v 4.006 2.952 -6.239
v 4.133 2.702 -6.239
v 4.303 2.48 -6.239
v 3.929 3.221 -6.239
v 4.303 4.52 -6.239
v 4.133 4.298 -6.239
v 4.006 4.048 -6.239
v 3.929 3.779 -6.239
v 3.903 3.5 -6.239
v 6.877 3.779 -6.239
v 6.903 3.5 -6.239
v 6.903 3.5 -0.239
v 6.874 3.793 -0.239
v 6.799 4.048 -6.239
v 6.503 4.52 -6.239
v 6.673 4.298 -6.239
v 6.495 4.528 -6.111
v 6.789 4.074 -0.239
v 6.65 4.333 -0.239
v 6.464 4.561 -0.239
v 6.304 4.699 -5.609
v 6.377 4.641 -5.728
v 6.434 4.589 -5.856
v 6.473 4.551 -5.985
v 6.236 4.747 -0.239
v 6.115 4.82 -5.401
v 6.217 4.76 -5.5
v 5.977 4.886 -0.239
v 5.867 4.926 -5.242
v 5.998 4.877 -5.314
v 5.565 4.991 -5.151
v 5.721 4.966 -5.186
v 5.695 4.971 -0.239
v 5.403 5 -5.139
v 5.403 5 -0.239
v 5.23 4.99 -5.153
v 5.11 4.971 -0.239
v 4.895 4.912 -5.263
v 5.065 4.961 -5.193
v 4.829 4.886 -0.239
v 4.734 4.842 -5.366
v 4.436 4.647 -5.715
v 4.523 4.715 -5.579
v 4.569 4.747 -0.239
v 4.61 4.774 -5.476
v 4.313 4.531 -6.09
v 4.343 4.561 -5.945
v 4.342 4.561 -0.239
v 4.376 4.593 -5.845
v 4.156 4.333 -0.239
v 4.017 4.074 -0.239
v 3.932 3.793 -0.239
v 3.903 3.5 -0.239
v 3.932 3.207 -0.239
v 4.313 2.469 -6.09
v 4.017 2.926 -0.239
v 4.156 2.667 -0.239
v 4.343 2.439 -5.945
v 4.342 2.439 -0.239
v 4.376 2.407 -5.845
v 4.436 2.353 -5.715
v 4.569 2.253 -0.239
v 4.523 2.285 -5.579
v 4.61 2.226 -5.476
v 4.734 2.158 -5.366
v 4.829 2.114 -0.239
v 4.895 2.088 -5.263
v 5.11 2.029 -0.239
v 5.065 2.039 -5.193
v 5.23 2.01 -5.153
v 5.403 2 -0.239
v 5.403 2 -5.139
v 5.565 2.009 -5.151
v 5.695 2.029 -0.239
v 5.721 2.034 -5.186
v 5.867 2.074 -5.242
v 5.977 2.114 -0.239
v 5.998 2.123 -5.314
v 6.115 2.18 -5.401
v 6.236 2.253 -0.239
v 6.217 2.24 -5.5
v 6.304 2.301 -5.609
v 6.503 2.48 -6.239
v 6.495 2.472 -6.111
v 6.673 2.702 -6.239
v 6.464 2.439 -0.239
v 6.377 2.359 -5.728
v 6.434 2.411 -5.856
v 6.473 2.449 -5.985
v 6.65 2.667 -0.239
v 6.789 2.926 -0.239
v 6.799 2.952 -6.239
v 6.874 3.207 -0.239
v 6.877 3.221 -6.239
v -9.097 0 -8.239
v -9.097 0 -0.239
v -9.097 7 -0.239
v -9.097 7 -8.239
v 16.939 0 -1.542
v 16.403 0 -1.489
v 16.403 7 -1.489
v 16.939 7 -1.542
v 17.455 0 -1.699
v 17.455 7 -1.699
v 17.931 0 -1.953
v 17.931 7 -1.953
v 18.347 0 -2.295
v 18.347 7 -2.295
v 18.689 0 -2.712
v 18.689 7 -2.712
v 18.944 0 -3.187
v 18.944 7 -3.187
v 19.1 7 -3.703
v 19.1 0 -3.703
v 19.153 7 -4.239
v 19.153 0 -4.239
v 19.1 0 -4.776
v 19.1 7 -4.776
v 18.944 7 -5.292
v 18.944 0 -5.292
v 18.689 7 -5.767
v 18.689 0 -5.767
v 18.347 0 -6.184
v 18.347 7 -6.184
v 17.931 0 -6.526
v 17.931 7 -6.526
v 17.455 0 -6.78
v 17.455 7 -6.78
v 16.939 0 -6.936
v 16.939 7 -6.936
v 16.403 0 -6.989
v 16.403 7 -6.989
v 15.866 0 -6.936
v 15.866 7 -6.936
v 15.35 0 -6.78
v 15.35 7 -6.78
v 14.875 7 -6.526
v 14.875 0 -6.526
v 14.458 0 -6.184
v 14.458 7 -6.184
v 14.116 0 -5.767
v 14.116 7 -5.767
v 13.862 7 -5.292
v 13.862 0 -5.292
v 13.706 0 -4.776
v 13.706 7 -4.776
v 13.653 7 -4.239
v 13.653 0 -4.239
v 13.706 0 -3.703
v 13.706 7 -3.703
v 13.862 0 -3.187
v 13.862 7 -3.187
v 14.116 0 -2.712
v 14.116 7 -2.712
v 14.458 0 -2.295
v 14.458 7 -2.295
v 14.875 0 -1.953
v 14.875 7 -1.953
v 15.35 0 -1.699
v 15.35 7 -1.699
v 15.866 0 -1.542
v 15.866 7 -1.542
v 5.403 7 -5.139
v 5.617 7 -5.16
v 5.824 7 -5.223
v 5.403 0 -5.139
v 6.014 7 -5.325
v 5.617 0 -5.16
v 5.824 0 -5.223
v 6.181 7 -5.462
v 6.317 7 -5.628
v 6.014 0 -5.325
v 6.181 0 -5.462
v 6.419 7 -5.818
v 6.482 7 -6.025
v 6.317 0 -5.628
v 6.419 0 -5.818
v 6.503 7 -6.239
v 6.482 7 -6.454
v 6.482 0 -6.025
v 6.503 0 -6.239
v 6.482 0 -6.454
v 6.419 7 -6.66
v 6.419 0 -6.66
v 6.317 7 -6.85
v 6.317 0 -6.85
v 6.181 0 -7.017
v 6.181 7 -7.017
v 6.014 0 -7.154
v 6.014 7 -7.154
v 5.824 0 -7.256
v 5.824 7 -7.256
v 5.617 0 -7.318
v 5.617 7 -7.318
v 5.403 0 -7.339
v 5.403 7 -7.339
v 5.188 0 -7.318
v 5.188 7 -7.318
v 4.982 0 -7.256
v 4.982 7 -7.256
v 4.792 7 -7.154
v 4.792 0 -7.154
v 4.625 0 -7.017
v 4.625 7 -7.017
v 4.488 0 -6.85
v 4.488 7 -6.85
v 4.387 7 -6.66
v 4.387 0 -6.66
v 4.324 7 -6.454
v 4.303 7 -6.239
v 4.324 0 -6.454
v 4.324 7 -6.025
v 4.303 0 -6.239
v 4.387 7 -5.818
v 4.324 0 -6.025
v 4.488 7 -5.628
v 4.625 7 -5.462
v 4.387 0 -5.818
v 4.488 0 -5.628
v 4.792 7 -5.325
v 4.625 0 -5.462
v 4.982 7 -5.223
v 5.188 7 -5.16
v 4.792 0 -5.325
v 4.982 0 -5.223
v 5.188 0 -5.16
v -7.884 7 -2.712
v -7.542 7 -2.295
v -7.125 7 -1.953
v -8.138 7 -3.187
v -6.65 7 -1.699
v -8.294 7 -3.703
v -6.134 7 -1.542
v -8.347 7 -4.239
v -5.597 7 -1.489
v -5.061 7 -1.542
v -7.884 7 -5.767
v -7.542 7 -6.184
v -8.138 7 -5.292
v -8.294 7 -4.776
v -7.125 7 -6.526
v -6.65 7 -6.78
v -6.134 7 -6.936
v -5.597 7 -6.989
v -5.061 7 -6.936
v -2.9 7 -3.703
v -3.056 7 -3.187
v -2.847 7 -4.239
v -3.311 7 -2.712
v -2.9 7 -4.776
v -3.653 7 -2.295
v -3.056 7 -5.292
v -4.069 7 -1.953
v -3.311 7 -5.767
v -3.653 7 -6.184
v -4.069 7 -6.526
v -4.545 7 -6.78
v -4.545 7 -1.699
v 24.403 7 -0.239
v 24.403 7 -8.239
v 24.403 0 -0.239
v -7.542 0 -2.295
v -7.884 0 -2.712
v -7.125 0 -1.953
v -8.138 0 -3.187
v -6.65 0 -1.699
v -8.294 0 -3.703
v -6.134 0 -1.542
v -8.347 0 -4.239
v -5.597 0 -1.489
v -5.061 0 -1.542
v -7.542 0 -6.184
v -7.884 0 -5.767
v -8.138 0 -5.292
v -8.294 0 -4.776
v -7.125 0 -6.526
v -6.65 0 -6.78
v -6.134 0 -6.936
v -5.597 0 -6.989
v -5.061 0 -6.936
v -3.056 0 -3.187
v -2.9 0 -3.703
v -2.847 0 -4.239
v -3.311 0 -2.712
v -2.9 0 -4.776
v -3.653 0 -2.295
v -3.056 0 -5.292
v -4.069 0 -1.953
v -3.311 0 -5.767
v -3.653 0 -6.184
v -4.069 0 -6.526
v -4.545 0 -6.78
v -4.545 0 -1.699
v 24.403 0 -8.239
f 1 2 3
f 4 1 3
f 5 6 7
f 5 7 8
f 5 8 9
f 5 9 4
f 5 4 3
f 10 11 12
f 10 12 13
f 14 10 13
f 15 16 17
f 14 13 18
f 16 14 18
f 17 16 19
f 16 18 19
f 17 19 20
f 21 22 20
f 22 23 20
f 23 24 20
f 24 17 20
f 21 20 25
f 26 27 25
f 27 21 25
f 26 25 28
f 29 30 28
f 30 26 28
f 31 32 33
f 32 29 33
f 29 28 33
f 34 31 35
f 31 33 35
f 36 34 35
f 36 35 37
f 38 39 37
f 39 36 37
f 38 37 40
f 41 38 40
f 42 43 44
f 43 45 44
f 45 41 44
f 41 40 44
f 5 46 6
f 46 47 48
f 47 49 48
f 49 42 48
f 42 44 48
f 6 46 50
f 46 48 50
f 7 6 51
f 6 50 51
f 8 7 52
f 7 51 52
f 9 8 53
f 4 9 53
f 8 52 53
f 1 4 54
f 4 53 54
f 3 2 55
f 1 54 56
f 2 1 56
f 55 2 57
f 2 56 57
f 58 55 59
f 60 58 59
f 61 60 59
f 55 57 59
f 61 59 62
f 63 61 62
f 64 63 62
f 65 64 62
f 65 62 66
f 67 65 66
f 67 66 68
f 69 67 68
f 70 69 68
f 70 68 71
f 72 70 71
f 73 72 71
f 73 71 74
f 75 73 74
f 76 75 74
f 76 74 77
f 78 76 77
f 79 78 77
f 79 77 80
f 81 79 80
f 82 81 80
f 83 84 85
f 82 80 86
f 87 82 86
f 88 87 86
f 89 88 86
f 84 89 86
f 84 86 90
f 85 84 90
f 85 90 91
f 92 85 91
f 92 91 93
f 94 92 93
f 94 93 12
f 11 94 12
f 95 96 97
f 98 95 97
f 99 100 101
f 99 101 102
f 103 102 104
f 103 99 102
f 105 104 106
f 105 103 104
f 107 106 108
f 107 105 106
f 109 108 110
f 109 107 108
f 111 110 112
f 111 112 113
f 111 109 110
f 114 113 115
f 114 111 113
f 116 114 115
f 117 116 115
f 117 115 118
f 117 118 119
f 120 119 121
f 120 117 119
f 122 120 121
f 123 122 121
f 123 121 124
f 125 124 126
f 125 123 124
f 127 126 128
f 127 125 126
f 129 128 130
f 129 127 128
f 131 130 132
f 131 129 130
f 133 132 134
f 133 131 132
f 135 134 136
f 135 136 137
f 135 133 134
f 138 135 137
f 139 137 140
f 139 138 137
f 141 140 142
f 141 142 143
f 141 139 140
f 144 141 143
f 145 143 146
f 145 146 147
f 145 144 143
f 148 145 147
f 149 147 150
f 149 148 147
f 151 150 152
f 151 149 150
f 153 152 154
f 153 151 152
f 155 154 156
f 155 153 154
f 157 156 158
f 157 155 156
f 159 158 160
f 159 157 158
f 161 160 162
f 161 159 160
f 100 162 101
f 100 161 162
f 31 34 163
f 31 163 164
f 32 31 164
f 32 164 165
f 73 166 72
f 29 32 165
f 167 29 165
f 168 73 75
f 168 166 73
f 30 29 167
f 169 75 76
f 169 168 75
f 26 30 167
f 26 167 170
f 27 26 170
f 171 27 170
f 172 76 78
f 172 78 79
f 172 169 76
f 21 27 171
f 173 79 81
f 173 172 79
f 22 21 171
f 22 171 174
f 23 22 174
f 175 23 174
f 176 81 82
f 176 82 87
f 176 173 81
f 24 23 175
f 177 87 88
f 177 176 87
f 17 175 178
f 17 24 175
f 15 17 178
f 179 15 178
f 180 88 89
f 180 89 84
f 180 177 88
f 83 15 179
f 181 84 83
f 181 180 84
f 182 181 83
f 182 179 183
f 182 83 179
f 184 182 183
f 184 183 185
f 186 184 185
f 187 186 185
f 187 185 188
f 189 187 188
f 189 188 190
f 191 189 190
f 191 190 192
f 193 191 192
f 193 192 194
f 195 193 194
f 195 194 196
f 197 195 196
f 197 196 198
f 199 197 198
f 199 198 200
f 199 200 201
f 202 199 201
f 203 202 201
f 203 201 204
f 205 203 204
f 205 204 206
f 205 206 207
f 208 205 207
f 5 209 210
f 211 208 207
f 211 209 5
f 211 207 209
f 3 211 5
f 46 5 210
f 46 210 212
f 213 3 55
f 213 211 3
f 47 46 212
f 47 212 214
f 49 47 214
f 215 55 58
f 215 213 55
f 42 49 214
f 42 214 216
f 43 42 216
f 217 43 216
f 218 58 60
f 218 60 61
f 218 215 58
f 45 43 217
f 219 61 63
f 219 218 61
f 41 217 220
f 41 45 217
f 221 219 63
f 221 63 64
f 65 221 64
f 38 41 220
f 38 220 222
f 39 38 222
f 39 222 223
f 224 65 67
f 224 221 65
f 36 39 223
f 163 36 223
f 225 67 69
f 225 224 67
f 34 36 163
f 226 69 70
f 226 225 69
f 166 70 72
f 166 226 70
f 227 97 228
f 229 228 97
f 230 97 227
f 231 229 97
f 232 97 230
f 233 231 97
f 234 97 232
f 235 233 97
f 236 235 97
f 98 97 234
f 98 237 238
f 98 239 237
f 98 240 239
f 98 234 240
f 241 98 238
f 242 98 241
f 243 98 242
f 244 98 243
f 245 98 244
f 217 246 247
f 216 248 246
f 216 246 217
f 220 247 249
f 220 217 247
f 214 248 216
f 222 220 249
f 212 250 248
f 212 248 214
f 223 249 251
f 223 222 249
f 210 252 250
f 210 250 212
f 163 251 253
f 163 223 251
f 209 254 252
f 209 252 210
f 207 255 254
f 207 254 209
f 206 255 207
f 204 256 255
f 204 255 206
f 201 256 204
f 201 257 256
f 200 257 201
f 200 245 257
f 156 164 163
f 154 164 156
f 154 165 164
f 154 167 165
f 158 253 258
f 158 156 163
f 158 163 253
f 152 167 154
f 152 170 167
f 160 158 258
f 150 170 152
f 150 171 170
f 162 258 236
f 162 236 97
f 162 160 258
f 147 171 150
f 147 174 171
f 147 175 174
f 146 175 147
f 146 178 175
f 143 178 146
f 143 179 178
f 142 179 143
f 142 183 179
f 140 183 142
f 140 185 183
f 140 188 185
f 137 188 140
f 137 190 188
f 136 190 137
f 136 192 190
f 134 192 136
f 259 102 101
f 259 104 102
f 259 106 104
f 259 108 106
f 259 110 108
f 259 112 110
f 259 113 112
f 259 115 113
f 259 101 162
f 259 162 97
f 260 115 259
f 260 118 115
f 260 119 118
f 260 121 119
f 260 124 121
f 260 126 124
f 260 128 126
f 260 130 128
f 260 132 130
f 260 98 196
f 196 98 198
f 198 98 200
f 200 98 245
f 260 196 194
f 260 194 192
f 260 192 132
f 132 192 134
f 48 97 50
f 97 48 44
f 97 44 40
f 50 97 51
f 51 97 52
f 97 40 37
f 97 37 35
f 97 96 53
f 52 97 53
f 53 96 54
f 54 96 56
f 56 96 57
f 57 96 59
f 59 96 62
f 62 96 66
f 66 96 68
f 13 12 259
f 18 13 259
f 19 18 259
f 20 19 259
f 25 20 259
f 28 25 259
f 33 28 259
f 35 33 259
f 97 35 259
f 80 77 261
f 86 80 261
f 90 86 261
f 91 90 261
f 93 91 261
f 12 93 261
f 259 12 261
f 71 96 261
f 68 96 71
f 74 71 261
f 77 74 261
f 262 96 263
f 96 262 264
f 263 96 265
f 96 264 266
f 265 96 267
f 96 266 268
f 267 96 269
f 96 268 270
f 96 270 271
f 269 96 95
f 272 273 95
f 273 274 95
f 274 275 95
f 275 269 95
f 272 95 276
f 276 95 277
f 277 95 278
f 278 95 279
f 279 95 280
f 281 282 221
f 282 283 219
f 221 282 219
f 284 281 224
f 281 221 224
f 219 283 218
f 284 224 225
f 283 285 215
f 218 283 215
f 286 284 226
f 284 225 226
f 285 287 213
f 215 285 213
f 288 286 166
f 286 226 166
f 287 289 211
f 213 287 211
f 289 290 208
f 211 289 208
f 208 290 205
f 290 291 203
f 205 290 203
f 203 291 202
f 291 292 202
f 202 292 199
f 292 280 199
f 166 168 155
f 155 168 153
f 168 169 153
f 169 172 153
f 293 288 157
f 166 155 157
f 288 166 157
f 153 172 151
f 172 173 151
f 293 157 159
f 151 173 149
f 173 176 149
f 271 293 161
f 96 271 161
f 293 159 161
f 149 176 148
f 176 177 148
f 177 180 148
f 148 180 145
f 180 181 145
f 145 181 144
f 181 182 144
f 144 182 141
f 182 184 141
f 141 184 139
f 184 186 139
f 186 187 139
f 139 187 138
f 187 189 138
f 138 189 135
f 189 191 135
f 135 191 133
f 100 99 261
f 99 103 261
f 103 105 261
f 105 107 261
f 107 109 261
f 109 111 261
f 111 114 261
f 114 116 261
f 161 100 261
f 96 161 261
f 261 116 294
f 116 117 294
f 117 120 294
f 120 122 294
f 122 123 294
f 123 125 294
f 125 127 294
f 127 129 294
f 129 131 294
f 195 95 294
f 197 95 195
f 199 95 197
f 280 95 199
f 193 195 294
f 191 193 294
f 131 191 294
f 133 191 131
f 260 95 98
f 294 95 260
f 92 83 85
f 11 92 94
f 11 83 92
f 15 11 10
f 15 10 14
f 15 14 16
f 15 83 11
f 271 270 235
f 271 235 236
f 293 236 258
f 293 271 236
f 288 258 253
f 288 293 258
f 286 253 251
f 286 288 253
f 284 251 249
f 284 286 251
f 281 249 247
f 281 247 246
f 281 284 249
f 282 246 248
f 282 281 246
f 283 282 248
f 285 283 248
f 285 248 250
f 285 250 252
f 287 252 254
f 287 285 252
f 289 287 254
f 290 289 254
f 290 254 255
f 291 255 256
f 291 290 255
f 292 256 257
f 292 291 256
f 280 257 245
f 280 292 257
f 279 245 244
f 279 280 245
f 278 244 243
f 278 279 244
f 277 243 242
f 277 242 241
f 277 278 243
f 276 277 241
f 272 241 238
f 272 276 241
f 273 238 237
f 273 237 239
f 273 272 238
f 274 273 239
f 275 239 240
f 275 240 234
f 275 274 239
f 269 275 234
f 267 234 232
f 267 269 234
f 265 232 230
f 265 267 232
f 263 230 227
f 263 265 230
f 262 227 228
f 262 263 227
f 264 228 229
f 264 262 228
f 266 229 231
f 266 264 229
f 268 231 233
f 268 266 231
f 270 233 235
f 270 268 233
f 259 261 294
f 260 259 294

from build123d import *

# Parameters (mm, degrees)
SKETCH_1_W          = 38
SKETCH_1_H          = 8
SKETCH_1_R          = 2.75
SKETCH_1_R_2        = 1.1
EXTRUDE_1_DEPTH     = 7
SKETCH_2_W          = 4.5
SKETCH_2_H          = 7
CUT_EXTRUDE_1_DEPTH = 27.617640313
SKETCH_4_R          = 1.5
CUT_EXTRUDE_2_DEPTH = 6


with BuildPart() as part:
    # 草图1 → 凸台-拉伸1 (new body)
    with BuildSketch(Plane(origin=(0, 0, 0), x_dir=(1, 0, 0), z_dir=(0, 1, 0))):
        with Locations((5.402843602, 4.239336493)):
            Rectangle(SKETCH_1_W, SKETCH_1_H)
        with Locations(Location((-5.597156398, 4.239336493, 0), (0, 0, 270))):
            Circle(SKETCH_1_R, mode=Mode.SUBTRACT)
        with Locations(Location((16.402843602, 4.239336493, 0), (0, 0, 270))):
            Circle(SKETCH_1_R, mode=Mode.SUBTRACT)
        with Locations(Location((5.402843602, 6.239336493, 0), (0, 0, 270))):
            Circle(SKETCH_1_R_2, mode=Mode.SUBTRACT)
    extrude(amount=EXTRUDE_1_DEPTH)

    # 草图2 → 切除-拉伸1 (cut, through all)
    with BuildSketch(Plane.XY.offset(-0.239336493)):
        with Locations((-11.347156398, 3.5)):
            Rectangle(SKETCH_2_W, SKETCH_2_H)
    extrude(amount=-CUT_EXTRUDE_1_DEPTH, mode=Mode.SUBTRACT)

    # 草图4 → 切除-拉伸2 (cut)
    with BuildSketch(Plane.XY.offset(-0.239336493)):
        with Locations((5.402843602, 3.5)):
            Circle(SKETCH_4_R)
    extrude(amount=-CUT_EXTRUDE_2_DEPTH, mode=Mode.SUBTRACT)


solid = part.part
